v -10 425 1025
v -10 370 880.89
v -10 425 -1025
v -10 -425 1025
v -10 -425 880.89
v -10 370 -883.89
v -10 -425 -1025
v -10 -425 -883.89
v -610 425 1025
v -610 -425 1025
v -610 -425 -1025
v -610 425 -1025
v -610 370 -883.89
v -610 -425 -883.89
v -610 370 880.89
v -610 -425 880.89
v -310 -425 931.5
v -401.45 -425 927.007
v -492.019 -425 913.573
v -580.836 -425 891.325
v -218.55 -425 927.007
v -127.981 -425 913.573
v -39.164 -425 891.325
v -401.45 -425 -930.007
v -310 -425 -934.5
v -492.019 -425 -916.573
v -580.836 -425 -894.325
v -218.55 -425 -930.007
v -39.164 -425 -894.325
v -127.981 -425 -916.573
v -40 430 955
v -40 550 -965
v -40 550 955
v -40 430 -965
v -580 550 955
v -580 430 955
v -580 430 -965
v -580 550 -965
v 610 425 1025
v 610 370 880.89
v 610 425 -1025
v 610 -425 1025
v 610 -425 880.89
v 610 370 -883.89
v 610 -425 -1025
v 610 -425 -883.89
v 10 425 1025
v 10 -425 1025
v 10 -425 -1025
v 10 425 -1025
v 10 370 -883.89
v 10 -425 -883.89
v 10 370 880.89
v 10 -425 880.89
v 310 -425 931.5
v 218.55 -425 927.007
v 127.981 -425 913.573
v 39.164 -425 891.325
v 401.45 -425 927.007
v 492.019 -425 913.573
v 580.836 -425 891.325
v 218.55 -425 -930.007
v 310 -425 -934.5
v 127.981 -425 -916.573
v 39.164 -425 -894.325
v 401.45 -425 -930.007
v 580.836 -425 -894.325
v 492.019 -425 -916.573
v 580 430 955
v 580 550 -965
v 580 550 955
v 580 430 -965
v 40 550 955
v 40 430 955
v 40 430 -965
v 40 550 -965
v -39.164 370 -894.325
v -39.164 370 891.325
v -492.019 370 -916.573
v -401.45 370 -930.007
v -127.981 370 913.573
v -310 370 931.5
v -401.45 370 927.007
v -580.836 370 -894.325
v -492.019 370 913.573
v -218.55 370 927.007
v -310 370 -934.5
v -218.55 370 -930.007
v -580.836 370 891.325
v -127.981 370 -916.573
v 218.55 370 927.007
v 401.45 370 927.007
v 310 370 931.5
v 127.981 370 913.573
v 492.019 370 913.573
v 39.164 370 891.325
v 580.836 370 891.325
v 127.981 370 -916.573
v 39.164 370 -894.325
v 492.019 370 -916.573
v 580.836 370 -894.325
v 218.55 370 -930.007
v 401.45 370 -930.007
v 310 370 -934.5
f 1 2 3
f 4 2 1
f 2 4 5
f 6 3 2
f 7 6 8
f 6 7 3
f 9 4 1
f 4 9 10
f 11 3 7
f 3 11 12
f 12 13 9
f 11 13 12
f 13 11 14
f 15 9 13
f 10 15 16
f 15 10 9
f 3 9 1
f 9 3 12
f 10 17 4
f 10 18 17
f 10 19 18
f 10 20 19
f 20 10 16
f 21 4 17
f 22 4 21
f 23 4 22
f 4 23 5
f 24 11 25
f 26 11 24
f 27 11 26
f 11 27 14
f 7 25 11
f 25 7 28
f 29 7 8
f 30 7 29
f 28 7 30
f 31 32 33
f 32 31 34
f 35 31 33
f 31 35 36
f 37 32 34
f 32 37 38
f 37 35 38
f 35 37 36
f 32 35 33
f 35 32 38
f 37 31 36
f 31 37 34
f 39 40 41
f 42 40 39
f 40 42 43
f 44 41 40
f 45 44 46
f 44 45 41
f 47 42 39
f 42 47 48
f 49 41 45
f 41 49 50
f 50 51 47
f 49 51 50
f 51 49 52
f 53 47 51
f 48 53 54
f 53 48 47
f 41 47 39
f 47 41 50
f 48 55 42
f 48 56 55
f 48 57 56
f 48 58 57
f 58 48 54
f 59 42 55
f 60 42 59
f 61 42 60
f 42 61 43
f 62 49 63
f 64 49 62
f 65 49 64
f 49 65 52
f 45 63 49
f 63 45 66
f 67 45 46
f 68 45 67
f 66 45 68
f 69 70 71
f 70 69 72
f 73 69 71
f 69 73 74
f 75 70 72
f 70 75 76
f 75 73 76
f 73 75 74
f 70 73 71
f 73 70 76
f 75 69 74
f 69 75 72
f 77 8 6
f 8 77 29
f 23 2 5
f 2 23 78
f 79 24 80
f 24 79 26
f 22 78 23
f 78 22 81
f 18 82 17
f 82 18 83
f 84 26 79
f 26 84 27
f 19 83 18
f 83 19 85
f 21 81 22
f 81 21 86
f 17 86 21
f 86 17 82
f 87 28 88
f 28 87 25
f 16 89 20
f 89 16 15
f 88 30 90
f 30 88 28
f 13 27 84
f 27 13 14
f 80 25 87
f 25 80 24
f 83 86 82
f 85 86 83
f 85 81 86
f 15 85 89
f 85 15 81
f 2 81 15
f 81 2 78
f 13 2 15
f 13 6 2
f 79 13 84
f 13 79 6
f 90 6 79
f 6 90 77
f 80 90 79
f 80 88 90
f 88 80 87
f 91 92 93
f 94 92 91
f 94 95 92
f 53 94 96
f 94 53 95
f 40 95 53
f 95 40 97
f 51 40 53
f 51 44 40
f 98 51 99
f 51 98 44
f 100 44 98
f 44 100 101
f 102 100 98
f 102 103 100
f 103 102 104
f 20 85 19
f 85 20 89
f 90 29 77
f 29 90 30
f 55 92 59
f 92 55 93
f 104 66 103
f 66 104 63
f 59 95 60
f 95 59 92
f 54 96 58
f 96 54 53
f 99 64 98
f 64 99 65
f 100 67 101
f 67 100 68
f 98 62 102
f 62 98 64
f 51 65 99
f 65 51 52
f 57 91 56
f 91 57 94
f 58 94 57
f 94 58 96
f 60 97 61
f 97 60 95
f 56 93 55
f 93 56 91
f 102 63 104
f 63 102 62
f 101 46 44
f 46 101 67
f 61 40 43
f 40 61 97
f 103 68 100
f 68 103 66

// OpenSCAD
// ============================================================================
// Atom Lithography Machine — Parametric OpenSCAD Module (S7.4-03)
// ============================================================================
// part_id           : S7.4-03
// parent_bom_id     : S7.4
// subsystem         : S7
// part_name         : 19 inc EMI-kalkanli kontrol/RF kabini ve su/hava isi esanjoru
// material          : Steel
// temp_stage        : 300 K (oda)
// vacuum_grade      : Atmosfer
// tolerance         : ±1 C
// computed_mass_kg  : 310.00000
// envelope_mm       : 1220.000 x 1030.100 x 2049.800
// design_maturity   : M0_M1_DETAILED_CAD_DESIGN_ONLY
// no_lab_measurement: true
// iec61508_certified: false
// semi_s2_certified : false
// Units: millimeters (mm)
// ============================================================================

$fn = 64;

// Nominal bounding envelope parameters (mm)
bbox_x = 1220.0000;
bbox_y = 1030.1000;
bbox_z = 2049.8000;

// Part-specific parametric dimensions
n_cabinets = 2;
rack_u = 42;
cab_w_mm = 600.0;
cab_d_mm = 850.0;
cab_h_mm = 2050.0;
bay_pitch_x_mm = 620.0;
hx_depth_mm = 120.0;

// Interface / port parameters (mm)
port_bay1_cw_supply_od = 32.000;
port_bay1_cw_supply_bore = 22.000;
port_bay2_cw_supply_od = 32.000;
port_bay2_cw_supply_bore = 22.000;

module part_S7_4_03() {
  difference() {
    union() {
      // Bay 1 42U EMI cabinet
      translate([-310.000, 0.000, 0.000]) cube([600.000, 850.000, 2050.000], center=true);
      // Bay 1 rear water/air HX
      translate([-310.000, 490.000, -5.000]) cube([540.000, 120.000, 1920.000], center=true);
      // Bay 2 42U EMI cabinet
      translate([310.000, 0.000, 0.000]) cube([600.000, 850.000, 2050.000], center=true);
      // Bay 2 rear water/air HX
      translate([310.000, 490.000, -5.000]) cube([540.000, 120.000, 1920.000], center=true);
    }
    // Bay 1 open 42U interior
    translate([-310.000, -30.000, -1.500]) rotate([90.000, 0.000, 0.000]) {
      hull() {
        translate([-0.000, 0, 0]) cylinder(d=1866.000, h=800.000, center=true);
        translate([0.000, 0, 0]) cylinder(d=1866.000, h=800.000, center=true);
      }
    }
    // Bay 2 open 42U interior
    translate([310.000, -30.000, -1.500]) rotate([90.000, 0.000, 0.000]) {
      hull() {
        translate([-0.000, 0, 0]) cylinder(d=1866.000, h=800.000, center=true);
        translate([0.000, 0, 0]) cylinder(d=1866.000, h=800.000, center=true);
      }
    }
  }
}

// World assembly mounting transform (global machine frame, mm / deg):
// translate([1790.000, 0.000, 1025.000]) rotate([0.000, 0.000, 0.000]) part_S7_4_03();

part_S7_4_03();
